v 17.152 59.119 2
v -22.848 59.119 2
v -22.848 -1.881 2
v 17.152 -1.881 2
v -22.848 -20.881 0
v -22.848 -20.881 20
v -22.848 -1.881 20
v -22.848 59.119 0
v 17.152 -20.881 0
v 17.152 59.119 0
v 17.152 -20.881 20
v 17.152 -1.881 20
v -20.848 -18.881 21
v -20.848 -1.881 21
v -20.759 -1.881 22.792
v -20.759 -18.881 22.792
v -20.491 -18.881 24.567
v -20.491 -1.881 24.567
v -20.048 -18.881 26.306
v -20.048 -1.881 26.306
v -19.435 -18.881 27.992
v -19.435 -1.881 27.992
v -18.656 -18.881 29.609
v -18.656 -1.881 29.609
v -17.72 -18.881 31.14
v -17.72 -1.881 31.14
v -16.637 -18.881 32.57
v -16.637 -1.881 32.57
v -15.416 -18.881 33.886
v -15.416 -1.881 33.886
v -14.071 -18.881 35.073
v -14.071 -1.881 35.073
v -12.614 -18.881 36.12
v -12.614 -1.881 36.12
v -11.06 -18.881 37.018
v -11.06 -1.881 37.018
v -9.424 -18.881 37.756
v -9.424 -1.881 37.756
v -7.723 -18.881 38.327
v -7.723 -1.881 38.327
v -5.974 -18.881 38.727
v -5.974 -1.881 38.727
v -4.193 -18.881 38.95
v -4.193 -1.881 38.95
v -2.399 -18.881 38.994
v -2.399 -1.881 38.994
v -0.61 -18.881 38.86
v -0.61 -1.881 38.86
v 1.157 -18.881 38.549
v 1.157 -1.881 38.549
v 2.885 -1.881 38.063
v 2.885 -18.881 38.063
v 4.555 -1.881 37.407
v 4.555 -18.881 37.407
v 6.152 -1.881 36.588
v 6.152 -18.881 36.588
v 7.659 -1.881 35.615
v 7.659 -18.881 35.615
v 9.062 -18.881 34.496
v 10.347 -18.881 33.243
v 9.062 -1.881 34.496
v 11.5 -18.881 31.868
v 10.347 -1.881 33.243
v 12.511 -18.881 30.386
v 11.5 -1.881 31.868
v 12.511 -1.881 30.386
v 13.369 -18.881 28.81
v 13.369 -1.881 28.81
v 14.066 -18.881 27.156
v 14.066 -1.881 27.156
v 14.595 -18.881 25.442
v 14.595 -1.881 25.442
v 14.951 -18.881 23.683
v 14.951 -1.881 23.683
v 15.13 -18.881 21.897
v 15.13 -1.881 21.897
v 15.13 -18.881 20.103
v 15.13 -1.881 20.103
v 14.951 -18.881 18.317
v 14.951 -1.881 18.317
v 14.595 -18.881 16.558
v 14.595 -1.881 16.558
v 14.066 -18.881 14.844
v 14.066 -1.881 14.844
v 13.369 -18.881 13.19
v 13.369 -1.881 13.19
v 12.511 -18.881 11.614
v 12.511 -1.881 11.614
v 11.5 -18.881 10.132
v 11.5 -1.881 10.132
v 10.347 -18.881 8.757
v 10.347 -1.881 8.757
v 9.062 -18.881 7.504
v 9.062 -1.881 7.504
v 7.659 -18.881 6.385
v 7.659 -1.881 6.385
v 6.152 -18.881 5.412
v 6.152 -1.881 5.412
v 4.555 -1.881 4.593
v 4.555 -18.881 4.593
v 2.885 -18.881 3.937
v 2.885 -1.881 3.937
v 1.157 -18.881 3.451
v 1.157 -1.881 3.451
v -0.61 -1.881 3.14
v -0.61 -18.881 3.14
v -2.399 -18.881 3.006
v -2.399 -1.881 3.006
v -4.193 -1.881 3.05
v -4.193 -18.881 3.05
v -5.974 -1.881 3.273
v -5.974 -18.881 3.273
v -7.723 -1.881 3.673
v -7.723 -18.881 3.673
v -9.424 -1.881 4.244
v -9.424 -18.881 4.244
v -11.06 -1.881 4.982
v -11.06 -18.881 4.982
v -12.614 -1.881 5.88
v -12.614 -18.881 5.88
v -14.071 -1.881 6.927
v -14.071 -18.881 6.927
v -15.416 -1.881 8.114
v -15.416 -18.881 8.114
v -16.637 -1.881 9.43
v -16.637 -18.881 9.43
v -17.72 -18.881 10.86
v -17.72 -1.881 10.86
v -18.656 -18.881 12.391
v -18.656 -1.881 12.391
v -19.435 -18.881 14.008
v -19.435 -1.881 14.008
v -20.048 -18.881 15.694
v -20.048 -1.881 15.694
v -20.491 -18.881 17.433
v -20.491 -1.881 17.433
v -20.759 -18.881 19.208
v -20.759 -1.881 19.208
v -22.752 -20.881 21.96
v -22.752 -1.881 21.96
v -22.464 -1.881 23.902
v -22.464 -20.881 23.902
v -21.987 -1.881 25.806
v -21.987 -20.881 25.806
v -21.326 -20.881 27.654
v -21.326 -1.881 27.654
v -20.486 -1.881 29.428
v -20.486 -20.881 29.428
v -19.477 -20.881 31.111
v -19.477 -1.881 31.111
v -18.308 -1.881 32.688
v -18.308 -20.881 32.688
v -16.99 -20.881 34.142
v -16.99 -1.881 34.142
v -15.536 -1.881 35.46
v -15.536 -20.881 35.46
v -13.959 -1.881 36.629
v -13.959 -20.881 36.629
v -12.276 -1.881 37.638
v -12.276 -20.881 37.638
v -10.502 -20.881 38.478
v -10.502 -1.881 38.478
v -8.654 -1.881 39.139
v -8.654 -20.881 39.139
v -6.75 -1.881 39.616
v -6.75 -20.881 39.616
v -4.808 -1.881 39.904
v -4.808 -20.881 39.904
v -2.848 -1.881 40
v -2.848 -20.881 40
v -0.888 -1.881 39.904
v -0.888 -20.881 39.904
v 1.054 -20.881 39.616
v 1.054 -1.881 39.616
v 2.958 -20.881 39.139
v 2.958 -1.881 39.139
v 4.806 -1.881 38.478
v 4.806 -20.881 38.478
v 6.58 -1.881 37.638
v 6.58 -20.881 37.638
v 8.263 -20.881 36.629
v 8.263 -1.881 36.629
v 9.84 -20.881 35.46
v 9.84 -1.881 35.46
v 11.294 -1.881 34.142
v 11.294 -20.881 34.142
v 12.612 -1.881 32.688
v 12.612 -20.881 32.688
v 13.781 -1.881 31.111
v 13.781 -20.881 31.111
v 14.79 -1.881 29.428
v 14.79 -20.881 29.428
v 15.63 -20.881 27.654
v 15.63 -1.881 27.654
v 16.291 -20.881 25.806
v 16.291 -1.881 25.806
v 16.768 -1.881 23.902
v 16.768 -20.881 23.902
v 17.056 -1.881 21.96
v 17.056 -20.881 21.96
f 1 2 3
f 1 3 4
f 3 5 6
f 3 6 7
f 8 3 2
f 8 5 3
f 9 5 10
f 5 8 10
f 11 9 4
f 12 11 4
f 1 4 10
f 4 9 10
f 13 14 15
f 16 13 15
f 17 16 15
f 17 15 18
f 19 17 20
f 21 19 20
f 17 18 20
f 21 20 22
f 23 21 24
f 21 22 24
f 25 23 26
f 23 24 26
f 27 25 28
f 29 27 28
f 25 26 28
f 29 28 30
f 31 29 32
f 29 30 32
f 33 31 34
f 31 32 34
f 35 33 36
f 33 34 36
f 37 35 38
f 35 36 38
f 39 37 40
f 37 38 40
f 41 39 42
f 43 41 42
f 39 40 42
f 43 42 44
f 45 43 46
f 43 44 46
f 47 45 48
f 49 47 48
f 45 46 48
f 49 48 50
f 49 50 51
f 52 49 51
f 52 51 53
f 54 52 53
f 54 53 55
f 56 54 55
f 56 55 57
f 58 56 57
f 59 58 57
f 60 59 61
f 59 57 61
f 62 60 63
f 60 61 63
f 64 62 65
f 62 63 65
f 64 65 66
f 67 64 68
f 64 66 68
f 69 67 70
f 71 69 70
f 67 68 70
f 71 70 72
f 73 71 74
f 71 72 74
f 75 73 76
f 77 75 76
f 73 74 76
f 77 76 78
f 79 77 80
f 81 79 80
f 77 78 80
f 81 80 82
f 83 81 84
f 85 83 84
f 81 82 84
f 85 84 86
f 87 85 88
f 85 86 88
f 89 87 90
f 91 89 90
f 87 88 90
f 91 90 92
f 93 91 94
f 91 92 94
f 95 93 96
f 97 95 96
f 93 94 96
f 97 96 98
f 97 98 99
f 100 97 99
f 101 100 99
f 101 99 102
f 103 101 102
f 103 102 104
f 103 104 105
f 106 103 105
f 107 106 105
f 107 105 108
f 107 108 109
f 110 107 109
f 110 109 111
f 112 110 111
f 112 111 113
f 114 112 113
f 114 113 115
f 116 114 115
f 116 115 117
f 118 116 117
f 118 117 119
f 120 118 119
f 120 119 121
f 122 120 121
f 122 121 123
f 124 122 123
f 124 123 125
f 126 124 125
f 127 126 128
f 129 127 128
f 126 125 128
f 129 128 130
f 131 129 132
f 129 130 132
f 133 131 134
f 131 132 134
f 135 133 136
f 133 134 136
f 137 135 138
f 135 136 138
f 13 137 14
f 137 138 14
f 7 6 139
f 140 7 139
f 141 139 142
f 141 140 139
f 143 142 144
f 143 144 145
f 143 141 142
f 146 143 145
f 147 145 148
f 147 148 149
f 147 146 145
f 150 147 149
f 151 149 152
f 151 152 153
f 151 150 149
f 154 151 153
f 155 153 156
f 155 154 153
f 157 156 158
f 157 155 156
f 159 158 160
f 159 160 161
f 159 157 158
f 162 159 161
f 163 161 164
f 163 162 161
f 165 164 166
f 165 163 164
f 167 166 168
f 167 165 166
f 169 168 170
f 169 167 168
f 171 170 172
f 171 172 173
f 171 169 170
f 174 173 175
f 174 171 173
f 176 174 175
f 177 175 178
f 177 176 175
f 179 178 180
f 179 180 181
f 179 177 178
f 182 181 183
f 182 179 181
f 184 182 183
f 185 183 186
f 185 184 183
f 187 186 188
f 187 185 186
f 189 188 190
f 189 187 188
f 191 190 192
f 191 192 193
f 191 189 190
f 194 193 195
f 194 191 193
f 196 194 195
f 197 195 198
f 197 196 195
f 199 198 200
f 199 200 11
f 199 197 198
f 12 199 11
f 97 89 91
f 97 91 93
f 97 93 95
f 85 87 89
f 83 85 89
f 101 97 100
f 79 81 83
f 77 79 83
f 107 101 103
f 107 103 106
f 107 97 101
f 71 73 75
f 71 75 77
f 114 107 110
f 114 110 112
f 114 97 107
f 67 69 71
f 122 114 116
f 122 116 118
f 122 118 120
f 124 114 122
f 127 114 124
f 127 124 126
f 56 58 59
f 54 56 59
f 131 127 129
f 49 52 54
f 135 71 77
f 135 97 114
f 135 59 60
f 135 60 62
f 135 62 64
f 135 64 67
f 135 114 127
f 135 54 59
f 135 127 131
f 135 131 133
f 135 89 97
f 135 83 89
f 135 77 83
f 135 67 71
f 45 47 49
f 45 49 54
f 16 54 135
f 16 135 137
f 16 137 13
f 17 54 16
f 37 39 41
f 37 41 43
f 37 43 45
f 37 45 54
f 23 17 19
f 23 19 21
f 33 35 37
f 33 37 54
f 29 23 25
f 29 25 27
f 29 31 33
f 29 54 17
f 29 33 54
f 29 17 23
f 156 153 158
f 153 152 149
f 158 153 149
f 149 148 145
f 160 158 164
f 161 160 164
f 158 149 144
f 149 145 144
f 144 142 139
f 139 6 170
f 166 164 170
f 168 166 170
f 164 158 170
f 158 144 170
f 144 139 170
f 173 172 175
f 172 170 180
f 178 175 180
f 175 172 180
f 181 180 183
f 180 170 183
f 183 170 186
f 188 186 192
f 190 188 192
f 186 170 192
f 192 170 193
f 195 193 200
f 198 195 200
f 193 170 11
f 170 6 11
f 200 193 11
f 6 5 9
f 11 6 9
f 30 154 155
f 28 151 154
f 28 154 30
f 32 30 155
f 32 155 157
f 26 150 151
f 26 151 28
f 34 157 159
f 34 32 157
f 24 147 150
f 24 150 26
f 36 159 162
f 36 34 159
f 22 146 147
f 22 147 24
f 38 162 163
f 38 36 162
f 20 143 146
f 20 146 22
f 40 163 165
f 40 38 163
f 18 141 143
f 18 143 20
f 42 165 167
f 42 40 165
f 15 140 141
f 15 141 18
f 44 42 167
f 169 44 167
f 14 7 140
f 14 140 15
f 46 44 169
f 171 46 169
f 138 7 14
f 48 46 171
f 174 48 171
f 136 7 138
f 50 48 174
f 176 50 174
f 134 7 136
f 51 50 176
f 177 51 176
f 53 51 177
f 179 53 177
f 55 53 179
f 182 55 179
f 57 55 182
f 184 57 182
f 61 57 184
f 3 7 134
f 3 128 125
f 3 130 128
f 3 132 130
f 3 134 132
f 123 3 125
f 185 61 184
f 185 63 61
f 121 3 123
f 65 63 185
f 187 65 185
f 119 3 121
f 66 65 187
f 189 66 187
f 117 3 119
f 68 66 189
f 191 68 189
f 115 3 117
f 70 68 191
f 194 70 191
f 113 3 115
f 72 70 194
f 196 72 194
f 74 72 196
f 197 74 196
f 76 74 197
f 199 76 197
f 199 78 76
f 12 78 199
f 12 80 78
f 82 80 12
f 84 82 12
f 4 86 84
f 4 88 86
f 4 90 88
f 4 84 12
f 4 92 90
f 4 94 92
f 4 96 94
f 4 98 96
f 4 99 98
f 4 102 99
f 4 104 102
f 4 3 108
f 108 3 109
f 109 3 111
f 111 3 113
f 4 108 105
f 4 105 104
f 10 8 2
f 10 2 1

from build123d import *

# Parameters (mm, degrees)
F0_W     = 40
F0_H     = 61
F1_DEPTH = 2
F0_H_2   = 19
F2_DEPTH = 40
F3_R     = 18
F4_DEPTH = 17
F5_R     = 19.99999


# Not quite as in the source:
# - a fillet or chamfer is up to 0.001 mm smaller than in the source, because OpenCascade refuses the exact size


with BuildPart() as f1:
    # F0 (on Top) → F1 (new body)
    with BuildSketch(Plane.XY):
        with Locations((-2.8480109572, 28.6193176061)):
            Rectangle(F0_W, F0_H)
    extrude(amount=F1_DEPTH)

    # F0 (on Top) → F2 (join)
    with BuildSketch(Plane.XY):
        with Locations((-2.8480109572, -11.3806823939)):
            Rectangle(F0_W, F0_H_2)
    extrude(amount=F2_DEPTH)

    # F3 (on face) → F4 (cut)
    with BuildSketch(Plane(origin=(0, -1.8806823939, 0), x_dir=(-1, 0, 0), z_dir=(0, 1, 0))):
        with Locations((2.8480109572, 21)):
            Circle(F3_R)
    extrude(amount=-F4_DEPTH, mode=Mode.SUBTRACT)

    # F5 (radius 20 in the source; OpenCascade refuses exactly that, so slightly less here)
    f5_edges = [f1.edges().sort_by_distance(p)[0] for p in [
        (17.151989, -11.380682, 40),
        (-22.848011, -11.380682, 40),
    ]]
    fillet(f5_edges, radius=F5_R)


solid = f1.part
